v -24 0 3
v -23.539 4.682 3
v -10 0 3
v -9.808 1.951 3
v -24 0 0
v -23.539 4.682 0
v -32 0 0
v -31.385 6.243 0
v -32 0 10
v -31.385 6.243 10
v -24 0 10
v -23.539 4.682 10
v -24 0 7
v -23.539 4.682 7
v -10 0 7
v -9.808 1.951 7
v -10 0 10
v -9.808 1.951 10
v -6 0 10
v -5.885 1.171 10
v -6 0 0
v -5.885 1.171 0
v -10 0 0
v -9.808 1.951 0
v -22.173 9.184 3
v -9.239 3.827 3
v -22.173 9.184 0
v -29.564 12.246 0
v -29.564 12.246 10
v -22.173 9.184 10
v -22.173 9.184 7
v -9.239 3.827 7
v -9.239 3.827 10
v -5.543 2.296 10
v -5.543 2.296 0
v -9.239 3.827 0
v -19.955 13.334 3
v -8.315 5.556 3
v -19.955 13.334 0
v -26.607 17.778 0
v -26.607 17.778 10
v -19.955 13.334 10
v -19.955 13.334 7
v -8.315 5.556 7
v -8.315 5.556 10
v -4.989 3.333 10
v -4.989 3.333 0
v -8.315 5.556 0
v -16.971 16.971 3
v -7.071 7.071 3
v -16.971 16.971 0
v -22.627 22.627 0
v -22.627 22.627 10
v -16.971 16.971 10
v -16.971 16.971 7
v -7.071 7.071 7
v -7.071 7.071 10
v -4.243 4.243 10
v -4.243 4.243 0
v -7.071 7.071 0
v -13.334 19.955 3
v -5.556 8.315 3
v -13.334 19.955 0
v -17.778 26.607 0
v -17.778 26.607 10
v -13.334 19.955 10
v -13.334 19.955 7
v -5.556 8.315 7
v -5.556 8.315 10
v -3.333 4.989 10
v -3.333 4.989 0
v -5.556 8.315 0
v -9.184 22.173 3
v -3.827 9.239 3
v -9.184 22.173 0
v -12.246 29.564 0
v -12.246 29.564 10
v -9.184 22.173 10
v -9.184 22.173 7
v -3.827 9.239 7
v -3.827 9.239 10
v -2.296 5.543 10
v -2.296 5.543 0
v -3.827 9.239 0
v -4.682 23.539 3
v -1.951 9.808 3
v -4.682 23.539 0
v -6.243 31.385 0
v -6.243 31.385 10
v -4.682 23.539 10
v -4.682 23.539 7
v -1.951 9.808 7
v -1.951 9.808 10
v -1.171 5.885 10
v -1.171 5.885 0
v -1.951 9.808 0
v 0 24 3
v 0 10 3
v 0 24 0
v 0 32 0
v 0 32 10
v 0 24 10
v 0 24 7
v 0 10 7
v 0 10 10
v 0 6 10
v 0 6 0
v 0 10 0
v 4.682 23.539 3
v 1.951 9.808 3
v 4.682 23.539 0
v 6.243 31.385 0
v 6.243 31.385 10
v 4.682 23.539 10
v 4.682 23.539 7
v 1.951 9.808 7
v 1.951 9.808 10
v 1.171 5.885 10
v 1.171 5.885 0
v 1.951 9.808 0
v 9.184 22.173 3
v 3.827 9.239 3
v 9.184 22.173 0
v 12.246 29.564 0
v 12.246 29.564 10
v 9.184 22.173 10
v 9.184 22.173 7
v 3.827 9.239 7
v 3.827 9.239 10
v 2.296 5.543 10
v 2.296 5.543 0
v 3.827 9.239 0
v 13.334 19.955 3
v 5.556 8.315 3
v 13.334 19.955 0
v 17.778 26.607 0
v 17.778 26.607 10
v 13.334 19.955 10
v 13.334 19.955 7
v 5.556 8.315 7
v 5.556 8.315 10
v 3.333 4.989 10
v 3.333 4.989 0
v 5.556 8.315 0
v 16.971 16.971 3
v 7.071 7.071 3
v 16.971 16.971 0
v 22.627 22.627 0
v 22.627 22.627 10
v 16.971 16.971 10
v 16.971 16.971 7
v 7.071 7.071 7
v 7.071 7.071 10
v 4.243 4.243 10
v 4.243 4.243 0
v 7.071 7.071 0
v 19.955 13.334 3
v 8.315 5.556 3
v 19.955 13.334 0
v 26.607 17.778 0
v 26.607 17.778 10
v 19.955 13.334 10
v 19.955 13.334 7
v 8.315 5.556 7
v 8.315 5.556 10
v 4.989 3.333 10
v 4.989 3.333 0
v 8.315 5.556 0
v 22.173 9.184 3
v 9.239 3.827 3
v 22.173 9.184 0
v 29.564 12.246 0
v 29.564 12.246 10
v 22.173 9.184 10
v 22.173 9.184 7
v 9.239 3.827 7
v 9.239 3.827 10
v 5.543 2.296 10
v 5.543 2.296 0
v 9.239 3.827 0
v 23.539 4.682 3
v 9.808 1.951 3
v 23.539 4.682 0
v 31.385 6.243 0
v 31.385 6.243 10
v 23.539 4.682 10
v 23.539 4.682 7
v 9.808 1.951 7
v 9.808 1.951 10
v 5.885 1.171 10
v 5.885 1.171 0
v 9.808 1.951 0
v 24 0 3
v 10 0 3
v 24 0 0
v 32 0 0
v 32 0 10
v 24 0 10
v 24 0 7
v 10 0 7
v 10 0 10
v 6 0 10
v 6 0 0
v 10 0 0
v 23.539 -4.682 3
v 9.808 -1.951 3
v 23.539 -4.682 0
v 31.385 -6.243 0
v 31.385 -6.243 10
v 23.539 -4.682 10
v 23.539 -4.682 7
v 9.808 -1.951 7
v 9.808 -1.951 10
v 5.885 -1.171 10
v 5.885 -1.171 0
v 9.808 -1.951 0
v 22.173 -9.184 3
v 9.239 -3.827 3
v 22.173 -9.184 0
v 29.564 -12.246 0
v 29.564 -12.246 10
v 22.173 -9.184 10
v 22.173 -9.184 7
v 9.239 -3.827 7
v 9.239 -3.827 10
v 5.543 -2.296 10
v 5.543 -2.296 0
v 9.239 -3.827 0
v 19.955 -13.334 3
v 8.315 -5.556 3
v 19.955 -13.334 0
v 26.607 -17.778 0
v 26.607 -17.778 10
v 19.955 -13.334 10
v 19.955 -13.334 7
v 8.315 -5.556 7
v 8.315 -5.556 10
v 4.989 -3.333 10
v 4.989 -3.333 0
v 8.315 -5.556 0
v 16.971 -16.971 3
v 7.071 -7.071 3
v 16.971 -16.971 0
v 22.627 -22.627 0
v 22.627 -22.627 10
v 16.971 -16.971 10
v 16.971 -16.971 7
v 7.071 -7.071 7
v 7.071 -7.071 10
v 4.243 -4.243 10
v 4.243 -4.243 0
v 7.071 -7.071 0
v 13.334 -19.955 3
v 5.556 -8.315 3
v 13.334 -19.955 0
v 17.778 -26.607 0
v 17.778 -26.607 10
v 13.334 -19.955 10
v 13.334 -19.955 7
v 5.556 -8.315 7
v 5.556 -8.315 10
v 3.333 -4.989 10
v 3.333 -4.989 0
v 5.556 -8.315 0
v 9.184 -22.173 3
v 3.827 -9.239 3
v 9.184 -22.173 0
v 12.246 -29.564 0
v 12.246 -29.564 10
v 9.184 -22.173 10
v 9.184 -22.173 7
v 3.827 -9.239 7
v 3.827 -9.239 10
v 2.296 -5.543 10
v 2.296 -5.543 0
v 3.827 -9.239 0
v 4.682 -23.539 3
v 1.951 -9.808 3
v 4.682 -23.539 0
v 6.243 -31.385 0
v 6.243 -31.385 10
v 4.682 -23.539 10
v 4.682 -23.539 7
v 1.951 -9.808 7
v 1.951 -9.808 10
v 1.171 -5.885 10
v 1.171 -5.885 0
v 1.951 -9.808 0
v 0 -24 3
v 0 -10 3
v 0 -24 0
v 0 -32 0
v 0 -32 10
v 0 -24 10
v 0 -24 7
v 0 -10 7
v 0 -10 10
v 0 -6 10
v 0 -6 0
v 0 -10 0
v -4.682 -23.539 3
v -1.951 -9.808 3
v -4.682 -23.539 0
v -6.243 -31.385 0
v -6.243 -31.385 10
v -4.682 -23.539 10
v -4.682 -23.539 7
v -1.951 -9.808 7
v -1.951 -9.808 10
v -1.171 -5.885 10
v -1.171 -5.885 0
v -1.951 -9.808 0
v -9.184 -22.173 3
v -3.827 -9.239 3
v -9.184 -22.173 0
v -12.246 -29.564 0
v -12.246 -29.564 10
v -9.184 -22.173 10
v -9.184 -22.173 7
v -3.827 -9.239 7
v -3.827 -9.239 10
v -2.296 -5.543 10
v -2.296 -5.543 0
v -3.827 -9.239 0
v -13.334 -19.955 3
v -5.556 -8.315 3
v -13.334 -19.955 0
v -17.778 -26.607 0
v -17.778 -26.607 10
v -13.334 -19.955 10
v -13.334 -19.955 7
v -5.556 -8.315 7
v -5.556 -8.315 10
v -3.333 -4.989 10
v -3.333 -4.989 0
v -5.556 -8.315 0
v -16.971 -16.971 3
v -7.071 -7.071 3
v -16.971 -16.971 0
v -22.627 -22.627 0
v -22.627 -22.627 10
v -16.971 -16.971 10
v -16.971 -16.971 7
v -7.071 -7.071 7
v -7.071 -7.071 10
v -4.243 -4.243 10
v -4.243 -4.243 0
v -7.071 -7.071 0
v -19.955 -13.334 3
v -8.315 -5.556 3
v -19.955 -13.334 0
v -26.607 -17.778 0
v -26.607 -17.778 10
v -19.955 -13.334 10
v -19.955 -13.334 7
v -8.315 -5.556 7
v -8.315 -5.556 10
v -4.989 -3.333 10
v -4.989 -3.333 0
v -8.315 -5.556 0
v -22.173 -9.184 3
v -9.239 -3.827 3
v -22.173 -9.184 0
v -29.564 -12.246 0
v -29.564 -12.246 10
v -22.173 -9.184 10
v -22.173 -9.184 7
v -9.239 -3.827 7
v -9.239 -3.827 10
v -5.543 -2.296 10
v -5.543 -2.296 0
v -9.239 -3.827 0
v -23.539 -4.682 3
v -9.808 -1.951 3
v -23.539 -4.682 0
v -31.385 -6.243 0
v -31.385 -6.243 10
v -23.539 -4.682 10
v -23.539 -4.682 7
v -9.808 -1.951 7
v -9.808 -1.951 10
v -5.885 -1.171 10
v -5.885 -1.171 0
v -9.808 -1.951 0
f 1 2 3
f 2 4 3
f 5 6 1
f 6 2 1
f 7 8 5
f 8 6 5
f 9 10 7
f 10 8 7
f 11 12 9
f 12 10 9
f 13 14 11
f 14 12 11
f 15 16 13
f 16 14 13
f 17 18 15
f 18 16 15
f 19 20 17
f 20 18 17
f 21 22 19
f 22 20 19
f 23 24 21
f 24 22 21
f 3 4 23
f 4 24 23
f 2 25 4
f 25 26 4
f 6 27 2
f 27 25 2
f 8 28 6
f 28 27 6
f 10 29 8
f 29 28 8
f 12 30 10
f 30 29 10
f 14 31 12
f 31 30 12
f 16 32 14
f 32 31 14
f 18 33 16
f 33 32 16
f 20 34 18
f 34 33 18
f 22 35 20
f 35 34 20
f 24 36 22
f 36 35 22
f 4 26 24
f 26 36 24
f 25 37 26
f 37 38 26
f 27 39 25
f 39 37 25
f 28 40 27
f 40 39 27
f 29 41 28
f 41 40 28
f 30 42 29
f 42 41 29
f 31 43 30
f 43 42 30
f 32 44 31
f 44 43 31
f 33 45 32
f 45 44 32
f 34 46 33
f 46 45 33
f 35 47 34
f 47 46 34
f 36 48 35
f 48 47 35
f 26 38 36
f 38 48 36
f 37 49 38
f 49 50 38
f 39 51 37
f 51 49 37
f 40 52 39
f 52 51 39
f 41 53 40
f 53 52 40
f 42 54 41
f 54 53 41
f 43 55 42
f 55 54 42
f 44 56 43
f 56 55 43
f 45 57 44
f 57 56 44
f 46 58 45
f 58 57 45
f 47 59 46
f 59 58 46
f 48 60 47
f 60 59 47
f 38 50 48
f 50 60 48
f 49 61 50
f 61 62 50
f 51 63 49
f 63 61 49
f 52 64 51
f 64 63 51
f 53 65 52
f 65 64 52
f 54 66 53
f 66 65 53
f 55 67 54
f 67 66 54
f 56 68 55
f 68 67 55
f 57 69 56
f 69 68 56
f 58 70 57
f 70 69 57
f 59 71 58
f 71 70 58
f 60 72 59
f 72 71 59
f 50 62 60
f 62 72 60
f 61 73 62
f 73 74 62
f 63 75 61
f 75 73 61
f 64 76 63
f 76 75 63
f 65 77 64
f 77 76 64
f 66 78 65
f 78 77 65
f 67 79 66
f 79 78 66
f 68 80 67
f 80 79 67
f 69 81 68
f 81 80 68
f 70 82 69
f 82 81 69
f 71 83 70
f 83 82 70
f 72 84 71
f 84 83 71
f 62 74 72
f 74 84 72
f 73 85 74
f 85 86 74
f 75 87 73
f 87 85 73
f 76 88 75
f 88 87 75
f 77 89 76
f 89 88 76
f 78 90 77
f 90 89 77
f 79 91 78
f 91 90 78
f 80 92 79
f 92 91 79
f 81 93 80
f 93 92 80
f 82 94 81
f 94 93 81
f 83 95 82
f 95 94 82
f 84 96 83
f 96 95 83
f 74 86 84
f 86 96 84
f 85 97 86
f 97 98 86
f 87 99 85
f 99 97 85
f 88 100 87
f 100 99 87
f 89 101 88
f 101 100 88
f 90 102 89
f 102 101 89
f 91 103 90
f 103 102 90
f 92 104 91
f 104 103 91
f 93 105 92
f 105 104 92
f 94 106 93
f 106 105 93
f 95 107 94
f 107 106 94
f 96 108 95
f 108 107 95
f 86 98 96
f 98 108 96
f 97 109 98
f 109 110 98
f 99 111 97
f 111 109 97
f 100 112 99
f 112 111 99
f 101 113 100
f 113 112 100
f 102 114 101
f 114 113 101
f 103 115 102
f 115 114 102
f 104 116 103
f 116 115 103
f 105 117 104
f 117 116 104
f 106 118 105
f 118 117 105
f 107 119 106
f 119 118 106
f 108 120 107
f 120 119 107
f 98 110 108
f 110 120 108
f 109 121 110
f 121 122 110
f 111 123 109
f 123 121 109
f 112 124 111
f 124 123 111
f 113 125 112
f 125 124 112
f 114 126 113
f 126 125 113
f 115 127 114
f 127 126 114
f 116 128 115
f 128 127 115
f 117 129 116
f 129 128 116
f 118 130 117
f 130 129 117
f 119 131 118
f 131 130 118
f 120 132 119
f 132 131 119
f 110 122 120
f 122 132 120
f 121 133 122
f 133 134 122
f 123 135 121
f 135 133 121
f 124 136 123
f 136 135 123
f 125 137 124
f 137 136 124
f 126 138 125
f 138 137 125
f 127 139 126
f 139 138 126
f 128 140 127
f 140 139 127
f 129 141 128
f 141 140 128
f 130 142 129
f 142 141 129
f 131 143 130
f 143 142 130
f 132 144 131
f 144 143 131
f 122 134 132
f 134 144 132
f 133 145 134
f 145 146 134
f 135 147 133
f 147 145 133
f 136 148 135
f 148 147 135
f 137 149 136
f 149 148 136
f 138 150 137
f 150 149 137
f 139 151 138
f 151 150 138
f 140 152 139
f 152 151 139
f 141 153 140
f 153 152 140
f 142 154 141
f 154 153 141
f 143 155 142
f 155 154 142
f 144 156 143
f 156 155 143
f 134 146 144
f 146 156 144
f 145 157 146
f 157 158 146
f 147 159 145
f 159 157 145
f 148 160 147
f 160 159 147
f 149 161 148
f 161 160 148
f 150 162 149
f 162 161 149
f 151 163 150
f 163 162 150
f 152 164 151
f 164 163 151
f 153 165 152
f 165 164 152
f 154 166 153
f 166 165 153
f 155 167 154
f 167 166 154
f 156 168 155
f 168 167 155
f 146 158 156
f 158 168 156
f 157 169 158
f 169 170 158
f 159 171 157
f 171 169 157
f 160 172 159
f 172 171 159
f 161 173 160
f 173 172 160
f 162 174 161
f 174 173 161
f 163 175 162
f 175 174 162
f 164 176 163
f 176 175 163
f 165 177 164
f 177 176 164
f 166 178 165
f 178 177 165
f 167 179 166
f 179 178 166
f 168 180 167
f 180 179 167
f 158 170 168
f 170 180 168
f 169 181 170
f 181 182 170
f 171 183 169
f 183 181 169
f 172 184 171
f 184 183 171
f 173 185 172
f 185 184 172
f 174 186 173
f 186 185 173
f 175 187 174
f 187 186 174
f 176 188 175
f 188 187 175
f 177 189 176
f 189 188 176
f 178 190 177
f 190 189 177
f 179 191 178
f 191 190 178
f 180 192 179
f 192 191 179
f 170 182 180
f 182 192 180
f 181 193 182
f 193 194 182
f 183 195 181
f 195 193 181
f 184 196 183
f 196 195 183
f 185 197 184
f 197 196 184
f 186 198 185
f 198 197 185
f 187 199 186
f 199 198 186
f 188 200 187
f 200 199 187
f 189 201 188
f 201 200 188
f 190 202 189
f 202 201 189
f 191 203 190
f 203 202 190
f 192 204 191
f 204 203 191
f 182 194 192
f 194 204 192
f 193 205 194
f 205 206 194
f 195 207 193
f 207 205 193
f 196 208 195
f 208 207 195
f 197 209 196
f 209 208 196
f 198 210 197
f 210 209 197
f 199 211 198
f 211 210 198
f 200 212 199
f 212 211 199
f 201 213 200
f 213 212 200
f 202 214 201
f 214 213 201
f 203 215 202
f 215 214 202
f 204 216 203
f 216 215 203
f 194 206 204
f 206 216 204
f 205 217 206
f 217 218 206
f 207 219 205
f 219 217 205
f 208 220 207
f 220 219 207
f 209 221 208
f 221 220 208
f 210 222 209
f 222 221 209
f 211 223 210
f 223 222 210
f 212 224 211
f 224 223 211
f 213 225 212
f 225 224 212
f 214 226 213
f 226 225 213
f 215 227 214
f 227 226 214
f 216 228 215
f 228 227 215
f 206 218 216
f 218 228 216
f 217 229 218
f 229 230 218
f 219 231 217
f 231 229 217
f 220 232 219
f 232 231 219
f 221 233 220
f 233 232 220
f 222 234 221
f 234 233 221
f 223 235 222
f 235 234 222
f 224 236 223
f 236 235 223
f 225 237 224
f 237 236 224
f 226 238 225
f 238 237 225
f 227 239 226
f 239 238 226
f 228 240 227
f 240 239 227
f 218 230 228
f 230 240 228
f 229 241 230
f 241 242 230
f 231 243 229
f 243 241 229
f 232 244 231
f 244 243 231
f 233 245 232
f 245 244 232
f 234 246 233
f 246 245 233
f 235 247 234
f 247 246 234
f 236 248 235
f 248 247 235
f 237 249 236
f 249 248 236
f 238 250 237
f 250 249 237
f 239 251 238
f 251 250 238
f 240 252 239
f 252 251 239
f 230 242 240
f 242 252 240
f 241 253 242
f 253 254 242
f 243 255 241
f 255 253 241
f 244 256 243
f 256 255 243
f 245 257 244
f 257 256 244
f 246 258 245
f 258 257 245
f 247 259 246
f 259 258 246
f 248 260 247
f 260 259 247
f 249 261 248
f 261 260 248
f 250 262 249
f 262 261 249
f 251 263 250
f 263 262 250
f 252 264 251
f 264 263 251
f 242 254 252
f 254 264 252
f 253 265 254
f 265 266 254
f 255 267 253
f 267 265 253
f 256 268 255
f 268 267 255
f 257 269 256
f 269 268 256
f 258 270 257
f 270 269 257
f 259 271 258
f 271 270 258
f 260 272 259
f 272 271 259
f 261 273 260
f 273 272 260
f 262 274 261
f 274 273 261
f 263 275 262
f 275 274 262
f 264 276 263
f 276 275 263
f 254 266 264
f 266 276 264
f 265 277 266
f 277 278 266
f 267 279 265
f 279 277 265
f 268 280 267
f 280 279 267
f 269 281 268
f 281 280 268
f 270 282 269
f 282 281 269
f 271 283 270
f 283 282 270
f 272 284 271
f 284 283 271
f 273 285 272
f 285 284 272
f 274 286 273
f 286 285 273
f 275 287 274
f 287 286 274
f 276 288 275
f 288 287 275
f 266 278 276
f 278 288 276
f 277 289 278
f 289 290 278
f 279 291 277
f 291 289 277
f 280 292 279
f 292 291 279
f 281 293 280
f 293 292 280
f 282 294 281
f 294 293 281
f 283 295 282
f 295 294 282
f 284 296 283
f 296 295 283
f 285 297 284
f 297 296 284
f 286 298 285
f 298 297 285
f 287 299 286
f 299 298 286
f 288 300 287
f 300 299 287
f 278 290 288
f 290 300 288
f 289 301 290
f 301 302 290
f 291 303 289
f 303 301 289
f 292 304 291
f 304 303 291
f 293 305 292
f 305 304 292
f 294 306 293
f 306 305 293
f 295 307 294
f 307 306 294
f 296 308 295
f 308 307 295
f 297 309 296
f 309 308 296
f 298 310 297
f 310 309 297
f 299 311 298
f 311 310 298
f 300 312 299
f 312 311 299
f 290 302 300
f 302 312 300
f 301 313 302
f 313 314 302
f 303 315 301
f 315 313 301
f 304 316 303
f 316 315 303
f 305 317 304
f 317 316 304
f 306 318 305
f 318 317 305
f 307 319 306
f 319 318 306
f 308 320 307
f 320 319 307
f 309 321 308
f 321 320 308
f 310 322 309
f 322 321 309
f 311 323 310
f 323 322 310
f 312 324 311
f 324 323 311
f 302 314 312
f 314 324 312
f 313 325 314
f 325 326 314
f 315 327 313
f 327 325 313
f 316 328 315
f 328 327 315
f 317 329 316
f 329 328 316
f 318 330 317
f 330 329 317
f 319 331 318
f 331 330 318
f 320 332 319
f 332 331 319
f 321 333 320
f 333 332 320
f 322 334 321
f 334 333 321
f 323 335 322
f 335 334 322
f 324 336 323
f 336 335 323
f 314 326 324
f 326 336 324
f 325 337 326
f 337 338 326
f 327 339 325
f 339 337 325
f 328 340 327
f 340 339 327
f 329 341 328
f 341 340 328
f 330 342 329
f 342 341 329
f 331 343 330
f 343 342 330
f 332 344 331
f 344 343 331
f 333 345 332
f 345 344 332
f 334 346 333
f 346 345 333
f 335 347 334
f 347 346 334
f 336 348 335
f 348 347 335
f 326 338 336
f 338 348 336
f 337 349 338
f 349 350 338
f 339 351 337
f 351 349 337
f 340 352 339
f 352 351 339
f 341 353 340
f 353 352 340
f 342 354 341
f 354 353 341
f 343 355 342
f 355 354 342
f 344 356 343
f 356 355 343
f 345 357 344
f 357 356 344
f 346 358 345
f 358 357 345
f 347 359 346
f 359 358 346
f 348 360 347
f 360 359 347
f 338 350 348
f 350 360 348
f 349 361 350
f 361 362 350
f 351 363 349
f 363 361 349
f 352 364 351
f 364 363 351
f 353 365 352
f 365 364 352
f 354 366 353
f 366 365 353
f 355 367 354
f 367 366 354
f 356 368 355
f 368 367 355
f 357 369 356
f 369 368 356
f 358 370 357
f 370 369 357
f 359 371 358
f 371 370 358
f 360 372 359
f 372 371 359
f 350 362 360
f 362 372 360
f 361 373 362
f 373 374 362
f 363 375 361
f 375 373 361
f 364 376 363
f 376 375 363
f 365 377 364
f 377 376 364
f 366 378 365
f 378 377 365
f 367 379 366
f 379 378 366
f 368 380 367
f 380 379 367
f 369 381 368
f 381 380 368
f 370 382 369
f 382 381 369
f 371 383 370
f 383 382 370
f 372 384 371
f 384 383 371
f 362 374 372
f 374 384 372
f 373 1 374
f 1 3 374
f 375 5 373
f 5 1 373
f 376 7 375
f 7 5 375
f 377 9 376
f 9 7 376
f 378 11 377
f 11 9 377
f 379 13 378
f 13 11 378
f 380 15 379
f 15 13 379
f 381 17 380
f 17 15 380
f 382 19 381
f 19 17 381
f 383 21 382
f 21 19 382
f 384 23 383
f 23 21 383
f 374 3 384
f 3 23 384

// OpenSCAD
$fn = 32;

// ----------------------------------------------------------------------
// Revolved part: handwheel R32
// ----------------------------------------------------------------------

// --- parameters (mm) ---
bore_r = 6;               // bore radius
rim_r = 32;               // rim radius
rim_w = 8;                // rim axial width
rim_t = 10;               // rim diameter height
hub_r = 10;               // hub radius
web_t = 4;                // web thickness
revolve_angle = 360;      // revolve sweep, degrees

bore_d = 2 * bore_r;
rim_d = 2 * rim_r;
hub_d = 2 * hub_r;

profile = [[6, 0], [10, 0], [10, 3], [24, 3], [24, 0], [32, 0], [32, 10], [24, 10], [24, 7], [10, 7], [10, 10], [6, 10]];  // primary outline, 12 points, counter clockwise

// --- the one profile operation ---
rotate_extrude(angle = revolve_angle) polygon(points = profile);
